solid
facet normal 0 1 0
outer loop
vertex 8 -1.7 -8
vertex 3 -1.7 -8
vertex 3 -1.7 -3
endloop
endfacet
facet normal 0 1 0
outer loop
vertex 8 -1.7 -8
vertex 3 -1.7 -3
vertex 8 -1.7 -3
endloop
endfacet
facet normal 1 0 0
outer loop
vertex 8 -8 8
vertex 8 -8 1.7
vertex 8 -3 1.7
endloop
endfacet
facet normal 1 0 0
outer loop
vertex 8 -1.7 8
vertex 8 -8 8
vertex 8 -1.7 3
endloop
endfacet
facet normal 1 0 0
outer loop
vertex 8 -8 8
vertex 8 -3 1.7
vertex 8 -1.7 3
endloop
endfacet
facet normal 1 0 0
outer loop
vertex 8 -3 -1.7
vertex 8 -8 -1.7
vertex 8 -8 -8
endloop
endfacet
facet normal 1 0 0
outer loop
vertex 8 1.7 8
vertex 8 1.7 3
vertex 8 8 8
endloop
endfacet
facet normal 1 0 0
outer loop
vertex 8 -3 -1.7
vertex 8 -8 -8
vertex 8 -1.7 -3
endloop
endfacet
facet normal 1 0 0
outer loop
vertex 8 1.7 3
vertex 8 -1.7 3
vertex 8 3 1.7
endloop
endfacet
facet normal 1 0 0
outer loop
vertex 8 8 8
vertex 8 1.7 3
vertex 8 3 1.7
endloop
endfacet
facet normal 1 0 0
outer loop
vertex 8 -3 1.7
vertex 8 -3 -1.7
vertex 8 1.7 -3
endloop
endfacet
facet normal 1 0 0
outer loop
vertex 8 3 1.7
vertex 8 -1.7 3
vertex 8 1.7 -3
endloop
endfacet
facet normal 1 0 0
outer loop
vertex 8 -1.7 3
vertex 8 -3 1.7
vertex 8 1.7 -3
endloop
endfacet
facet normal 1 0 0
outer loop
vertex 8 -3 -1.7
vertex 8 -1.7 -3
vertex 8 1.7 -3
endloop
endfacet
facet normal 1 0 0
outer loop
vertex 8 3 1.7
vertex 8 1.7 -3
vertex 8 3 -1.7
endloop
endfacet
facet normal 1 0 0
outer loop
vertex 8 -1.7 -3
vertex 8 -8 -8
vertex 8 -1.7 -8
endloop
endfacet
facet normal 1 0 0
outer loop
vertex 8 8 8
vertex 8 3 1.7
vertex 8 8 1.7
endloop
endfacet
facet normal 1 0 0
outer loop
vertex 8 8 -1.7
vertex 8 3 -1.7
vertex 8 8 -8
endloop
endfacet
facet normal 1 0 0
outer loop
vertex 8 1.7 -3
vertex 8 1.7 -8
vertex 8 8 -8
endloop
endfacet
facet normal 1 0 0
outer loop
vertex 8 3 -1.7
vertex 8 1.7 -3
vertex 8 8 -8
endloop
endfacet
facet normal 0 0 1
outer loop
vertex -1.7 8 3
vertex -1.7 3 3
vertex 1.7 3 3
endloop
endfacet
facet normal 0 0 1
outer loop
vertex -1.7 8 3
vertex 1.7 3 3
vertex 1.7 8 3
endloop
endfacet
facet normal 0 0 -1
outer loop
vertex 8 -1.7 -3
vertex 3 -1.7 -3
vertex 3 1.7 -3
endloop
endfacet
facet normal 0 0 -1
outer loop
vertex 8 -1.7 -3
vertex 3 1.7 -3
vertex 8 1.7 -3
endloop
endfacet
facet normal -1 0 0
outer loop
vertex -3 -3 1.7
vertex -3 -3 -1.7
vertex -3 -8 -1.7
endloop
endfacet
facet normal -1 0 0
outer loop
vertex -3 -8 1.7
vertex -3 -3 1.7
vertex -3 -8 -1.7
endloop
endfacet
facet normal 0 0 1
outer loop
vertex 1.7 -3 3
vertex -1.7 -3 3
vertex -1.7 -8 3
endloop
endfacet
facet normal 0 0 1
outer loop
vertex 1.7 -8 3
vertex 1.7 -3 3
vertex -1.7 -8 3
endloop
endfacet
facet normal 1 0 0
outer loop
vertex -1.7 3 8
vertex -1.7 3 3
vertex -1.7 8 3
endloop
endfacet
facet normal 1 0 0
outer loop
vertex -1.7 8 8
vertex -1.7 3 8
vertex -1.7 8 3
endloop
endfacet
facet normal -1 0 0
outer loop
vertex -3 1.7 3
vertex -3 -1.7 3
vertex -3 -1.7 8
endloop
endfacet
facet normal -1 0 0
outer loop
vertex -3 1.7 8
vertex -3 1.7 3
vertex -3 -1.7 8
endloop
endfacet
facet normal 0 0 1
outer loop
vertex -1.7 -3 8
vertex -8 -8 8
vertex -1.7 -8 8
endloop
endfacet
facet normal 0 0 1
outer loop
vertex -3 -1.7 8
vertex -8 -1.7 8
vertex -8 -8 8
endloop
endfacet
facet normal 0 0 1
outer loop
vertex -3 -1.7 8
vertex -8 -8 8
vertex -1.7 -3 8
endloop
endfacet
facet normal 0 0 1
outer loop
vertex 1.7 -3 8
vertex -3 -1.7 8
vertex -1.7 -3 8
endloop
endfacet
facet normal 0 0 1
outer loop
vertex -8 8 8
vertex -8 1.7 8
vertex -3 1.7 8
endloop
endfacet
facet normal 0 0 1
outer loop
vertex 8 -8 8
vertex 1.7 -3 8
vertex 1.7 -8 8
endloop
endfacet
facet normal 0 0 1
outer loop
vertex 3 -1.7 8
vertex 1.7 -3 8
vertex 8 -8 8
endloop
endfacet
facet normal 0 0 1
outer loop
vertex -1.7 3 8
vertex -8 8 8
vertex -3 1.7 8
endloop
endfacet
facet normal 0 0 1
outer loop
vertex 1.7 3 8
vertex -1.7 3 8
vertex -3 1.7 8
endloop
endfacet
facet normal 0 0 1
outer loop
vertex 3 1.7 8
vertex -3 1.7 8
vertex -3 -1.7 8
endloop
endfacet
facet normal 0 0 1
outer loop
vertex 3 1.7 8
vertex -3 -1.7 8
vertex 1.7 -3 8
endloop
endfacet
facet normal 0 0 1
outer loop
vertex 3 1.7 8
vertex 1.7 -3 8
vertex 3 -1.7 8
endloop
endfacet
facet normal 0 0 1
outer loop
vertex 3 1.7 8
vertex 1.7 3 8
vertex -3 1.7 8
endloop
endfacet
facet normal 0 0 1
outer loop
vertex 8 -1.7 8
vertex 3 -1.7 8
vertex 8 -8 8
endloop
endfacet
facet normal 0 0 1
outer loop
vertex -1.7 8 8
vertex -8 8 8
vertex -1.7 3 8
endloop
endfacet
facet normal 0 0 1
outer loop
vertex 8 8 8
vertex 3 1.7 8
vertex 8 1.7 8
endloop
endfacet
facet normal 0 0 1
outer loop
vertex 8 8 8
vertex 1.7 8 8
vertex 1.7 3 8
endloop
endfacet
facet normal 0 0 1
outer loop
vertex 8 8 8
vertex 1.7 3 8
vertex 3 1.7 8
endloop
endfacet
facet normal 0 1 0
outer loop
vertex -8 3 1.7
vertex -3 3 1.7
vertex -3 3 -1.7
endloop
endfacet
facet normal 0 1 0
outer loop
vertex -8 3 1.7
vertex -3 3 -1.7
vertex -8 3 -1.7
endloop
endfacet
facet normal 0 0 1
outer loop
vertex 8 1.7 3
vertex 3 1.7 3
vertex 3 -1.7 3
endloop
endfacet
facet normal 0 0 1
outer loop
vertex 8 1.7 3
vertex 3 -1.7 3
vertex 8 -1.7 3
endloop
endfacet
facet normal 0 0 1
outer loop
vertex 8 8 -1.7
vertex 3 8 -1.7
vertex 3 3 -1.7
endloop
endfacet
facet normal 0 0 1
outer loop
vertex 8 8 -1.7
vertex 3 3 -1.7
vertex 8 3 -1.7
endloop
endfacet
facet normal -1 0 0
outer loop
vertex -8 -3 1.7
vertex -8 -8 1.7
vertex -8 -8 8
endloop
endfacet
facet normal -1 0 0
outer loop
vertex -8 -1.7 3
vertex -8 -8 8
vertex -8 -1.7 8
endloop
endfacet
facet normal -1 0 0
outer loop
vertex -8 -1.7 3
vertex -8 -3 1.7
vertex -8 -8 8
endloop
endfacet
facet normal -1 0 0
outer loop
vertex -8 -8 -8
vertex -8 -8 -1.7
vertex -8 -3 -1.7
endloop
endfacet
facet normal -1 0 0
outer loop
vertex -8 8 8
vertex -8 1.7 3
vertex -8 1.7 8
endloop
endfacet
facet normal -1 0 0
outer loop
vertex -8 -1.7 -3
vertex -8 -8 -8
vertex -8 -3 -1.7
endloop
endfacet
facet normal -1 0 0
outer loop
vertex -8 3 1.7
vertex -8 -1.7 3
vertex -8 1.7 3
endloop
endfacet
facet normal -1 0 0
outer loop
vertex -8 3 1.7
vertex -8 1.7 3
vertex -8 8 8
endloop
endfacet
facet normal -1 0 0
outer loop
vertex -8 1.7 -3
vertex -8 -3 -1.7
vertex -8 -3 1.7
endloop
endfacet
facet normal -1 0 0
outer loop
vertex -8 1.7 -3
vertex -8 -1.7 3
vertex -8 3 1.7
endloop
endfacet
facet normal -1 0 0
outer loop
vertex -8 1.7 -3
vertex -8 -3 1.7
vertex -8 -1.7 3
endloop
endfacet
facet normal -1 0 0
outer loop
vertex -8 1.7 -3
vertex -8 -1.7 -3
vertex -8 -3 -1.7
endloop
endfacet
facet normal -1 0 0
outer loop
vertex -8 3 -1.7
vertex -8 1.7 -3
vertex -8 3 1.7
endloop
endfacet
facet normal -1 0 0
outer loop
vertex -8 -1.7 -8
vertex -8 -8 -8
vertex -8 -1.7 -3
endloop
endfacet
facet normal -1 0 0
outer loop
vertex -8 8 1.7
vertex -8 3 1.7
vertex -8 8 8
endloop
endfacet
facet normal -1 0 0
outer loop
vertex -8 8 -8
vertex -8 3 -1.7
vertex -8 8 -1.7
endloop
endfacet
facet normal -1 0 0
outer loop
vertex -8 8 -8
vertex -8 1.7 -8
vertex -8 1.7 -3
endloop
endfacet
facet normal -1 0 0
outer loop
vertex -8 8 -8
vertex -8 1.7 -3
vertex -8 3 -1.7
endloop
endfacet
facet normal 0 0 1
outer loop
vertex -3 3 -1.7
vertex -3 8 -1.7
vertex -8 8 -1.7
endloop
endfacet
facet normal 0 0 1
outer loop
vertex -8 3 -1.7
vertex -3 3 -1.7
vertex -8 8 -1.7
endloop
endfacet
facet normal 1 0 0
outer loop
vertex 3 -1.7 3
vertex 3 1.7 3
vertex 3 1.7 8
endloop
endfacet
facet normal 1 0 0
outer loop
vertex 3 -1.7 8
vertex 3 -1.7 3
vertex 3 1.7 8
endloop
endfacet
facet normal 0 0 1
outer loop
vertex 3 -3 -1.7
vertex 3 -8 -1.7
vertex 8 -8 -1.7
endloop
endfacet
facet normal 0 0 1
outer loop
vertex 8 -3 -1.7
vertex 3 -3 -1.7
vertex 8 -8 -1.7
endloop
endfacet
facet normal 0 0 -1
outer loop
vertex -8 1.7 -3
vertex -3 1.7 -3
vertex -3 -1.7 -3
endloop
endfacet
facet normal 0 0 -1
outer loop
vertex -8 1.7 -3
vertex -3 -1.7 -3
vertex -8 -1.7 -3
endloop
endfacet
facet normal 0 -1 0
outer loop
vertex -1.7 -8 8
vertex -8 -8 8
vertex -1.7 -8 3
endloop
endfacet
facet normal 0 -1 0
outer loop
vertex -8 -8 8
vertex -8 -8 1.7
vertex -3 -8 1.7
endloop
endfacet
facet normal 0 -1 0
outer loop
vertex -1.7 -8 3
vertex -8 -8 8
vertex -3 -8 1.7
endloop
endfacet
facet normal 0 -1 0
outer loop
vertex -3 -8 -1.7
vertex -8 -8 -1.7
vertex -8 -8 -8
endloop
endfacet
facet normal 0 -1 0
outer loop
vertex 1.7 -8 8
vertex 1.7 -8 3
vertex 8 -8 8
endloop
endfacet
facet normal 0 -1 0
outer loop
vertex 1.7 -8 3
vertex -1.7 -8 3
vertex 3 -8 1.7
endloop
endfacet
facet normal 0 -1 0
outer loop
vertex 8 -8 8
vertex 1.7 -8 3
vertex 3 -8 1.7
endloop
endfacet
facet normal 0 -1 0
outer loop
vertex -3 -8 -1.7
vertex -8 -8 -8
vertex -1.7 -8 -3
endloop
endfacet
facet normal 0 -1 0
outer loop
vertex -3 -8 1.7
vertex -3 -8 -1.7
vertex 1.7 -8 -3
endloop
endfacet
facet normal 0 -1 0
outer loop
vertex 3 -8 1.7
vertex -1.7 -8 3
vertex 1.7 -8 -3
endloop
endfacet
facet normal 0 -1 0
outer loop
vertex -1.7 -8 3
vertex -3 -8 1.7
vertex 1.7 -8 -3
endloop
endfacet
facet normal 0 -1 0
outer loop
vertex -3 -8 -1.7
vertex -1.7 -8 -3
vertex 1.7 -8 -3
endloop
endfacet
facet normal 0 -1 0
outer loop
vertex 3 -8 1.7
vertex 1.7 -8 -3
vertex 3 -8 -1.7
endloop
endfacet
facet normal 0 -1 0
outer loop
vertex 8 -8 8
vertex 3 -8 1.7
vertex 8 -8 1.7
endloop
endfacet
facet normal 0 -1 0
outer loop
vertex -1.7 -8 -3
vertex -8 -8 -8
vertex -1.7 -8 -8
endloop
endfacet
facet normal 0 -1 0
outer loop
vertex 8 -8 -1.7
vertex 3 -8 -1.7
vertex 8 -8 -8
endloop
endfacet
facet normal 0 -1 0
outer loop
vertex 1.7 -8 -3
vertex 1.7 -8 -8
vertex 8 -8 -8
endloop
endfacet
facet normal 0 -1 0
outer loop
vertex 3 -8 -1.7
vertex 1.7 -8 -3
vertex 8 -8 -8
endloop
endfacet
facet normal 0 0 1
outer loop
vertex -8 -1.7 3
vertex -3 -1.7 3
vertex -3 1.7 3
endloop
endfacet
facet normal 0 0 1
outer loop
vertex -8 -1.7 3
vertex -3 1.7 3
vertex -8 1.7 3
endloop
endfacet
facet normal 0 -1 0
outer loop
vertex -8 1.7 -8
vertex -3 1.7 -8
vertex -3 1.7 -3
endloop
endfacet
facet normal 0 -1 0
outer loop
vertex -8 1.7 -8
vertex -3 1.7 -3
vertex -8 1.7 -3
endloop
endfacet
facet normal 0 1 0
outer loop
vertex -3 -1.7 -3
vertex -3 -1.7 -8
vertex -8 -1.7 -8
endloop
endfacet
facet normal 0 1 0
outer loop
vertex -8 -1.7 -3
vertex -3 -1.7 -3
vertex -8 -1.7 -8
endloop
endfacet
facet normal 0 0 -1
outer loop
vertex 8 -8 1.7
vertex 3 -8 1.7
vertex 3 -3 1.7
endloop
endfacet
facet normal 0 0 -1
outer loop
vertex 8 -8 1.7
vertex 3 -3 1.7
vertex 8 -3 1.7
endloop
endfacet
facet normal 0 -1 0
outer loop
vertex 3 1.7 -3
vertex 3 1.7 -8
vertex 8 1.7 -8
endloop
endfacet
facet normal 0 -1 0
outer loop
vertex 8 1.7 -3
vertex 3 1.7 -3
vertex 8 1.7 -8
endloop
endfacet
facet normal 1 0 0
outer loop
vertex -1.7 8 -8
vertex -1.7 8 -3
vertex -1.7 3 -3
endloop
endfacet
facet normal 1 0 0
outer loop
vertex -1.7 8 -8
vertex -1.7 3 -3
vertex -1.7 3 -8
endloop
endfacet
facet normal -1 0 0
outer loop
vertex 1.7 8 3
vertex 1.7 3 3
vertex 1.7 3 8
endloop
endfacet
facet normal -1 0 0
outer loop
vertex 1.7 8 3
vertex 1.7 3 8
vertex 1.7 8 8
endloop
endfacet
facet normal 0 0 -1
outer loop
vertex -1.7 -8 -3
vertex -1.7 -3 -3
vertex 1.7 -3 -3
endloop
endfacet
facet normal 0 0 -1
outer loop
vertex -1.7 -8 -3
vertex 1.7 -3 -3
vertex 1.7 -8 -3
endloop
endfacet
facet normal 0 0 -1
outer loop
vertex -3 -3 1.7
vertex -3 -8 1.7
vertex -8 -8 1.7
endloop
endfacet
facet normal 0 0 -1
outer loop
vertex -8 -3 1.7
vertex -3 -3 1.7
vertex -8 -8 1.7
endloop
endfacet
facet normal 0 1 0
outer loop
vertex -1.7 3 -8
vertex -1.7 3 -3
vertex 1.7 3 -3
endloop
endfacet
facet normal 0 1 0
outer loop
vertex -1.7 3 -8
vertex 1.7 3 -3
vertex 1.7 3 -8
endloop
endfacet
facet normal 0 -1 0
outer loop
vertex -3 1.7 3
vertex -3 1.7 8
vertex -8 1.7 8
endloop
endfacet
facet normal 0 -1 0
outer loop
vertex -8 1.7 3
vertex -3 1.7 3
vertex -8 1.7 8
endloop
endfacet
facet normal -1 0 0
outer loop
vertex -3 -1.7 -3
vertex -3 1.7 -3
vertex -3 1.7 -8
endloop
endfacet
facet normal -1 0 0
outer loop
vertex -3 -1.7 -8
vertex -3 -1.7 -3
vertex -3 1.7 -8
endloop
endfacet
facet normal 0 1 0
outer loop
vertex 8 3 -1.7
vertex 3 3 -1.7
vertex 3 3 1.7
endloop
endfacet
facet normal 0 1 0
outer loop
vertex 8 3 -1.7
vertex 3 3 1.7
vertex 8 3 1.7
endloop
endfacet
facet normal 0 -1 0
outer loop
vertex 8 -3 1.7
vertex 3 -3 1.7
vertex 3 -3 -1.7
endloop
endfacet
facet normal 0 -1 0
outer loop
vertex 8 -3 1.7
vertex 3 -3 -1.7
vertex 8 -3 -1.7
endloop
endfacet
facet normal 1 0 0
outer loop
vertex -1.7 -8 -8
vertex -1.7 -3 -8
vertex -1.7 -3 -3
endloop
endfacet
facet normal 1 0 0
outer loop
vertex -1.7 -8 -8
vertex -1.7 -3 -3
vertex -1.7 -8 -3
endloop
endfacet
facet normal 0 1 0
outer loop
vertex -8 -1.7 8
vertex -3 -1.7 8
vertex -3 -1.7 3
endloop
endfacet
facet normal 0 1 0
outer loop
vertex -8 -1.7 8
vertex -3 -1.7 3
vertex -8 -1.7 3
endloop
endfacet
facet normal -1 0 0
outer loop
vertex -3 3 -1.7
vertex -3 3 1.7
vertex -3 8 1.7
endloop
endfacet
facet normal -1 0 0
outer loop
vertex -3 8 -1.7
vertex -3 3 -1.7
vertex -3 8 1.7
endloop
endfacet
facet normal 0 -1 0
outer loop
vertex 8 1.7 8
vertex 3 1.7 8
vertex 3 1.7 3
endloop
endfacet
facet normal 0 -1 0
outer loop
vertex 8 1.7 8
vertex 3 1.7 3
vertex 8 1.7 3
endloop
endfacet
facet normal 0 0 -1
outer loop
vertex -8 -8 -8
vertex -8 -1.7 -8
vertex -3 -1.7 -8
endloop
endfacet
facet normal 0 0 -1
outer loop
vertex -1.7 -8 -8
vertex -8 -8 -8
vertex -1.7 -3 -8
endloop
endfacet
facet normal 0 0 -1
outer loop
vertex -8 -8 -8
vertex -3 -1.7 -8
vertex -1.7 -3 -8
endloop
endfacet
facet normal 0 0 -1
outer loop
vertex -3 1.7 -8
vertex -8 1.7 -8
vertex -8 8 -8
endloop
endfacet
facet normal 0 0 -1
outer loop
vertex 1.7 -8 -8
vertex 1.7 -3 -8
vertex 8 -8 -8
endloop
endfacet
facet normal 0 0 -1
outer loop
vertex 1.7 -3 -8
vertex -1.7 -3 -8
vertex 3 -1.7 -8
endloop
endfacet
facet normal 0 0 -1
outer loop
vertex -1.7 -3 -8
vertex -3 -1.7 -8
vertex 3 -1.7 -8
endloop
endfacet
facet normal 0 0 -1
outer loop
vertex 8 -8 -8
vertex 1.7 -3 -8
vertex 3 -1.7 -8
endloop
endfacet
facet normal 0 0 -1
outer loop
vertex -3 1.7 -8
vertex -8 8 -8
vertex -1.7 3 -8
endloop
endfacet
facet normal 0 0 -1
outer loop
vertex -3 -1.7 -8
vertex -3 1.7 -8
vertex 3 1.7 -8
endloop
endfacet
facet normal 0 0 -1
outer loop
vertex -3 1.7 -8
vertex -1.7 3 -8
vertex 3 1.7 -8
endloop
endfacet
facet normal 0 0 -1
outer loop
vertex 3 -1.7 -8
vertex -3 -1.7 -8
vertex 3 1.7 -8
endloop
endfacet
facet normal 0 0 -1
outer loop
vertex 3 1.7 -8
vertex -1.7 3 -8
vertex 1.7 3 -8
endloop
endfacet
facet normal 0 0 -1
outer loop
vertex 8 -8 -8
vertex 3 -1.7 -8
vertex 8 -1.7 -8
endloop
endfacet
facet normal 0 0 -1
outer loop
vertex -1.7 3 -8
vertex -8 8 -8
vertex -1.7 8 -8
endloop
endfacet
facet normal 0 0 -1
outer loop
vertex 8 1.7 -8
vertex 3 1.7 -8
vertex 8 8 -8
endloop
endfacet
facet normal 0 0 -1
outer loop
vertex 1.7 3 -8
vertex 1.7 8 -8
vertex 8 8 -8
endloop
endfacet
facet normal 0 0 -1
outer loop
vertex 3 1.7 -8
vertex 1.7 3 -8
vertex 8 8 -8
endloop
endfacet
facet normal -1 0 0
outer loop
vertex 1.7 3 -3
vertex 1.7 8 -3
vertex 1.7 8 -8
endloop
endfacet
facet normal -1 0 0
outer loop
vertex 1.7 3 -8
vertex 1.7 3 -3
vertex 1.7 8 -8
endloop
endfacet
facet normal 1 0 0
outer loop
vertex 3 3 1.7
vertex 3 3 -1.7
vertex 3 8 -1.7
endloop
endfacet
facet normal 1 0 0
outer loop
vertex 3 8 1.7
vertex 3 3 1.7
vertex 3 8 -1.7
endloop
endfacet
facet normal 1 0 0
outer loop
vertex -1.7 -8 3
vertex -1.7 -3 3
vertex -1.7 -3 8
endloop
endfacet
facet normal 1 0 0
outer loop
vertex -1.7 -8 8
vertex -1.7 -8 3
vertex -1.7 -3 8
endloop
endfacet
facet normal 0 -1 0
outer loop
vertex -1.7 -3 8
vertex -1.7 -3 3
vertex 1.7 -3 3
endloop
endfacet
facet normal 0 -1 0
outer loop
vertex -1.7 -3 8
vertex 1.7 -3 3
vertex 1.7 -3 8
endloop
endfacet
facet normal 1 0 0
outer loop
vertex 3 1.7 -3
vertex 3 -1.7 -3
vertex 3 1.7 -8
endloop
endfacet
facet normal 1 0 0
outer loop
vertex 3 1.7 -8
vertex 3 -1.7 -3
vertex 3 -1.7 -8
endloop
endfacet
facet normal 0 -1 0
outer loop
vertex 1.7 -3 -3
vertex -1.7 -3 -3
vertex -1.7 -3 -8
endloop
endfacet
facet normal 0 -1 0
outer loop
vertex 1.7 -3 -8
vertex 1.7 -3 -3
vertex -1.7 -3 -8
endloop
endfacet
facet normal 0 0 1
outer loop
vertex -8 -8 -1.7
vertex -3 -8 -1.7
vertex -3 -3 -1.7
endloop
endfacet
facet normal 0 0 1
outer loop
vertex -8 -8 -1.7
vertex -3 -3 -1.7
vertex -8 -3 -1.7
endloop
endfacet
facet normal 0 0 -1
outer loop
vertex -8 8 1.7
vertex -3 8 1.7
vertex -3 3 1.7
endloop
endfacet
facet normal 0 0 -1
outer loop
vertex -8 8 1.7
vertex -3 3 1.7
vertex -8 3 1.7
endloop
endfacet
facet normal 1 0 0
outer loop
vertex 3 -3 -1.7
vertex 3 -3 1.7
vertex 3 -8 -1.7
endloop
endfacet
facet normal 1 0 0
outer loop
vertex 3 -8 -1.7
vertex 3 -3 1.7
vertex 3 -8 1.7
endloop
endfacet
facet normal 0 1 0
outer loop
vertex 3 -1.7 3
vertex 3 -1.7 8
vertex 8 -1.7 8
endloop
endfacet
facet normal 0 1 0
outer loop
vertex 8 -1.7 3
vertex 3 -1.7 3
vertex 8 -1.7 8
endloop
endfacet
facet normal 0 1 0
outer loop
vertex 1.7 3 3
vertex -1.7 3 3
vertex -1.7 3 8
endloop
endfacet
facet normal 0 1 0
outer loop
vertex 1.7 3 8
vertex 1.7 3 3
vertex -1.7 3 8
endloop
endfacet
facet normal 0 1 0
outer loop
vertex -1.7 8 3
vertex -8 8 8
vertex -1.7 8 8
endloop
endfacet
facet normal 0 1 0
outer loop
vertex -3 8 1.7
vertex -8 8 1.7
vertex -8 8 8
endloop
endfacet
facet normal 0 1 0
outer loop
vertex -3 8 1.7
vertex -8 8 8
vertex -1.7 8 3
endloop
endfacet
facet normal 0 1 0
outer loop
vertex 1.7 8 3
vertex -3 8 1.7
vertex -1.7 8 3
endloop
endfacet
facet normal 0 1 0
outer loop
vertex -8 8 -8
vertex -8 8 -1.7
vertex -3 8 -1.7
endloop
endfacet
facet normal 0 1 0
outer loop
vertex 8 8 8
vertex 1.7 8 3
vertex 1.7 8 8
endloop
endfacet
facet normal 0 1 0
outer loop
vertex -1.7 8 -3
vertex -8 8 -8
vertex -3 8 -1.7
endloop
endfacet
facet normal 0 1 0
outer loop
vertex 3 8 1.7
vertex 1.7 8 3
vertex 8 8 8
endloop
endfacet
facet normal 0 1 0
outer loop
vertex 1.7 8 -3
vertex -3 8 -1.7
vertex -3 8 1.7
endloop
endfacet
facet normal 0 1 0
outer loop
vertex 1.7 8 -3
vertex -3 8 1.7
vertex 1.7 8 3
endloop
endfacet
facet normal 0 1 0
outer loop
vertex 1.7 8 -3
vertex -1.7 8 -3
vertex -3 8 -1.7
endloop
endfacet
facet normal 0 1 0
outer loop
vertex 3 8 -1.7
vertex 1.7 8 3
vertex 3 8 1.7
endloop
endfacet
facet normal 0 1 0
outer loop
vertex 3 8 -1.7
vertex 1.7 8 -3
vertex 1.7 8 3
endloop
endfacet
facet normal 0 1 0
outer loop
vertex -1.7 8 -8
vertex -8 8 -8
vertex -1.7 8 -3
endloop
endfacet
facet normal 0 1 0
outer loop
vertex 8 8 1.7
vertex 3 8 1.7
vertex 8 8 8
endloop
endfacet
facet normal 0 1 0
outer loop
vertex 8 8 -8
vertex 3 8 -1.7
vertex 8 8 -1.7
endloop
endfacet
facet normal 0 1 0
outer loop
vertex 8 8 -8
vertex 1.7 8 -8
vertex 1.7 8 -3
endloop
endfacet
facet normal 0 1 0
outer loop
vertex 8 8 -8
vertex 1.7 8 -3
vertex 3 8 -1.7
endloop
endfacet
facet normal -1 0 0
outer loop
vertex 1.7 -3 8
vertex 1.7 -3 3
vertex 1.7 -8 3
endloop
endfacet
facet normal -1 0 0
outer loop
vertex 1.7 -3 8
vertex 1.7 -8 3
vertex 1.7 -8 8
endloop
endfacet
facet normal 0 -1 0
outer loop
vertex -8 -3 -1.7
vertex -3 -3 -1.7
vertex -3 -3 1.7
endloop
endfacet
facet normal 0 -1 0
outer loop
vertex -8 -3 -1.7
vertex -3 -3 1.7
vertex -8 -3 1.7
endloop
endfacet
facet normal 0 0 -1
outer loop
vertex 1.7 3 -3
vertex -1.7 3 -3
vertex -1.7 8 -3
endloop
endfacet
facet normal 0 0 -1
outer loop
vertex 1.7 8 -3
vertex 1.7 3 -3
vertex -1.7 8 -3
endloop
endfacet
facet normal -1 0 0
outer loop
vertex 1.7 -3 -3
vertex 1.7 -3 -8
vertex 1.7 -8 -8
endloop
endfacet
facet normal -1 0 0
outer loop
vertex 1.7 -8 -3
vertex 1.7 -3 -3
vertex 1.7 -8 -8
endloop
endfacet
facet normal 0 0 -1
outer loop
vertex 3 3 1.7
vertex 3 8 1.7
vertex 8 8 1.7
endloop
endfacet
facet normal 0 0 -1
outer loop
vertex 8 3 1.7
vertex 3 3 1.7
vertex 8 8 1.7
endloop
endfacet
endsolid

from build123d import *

# Parameters (mm, degrees)
BOX002_W       = 90
BOX002_H       = 90
BOX002_DEPTH   = 3.4
ARRAY004_COUNT = 3
ARRAY004_ANGLE = 180
ARRAY_COUNT    = 4
BOX_W          = 16
BOX_H          = 16
BOX_DEPTH      = 16


with BuildPart() as array:
    # Box002 → Box002 (new body)
    with BuildSketch(Plane(origin=(3, 3, -1.7), x_dir=(1, 0, 0), z_dir=(0, 0, 1))):
        with Locations((45, 45)):
            Rectangle(BOX002_W, BOX002_H)
    extrude(amount=BOX002_DEPTH)

    # Array004: Array ×3 about axis
    array004_axis = Axis((0, 0, 0), (0, 1, 0))


with BuildPart() as array_1:
    add(array.part)
    for i in range(1, ARRAY004_COUNT):
        add(array.part.rotate(array004_axis, i * ARRAY004_ANGLE / (ARRAY004_COUNT - 1)))

    # Array: Array ×4 about axis
    array_axis = Axis((0, 0, 0), (1, 0, 0))


with BuildPart() as array_2:
    add(array_1.part)
    for i in range(1, ARRAY_COUNT):
        add(array_1.part.rotate(array_axis, i * 360 / ARRAY_COUNT))


with BuildPart() as cut001:
    # Box → Box (new body)
    with BuildSketch(Plane(origin=(-8, -8, -8), x_dir=(1, 0, 0), z_dir=(0, 0, 1))):
        with Locations((8, 8)):
            Rectangle(BOX_W, BOX_H)
    extrude(amount=BOX_DEPTH)

    # Cut001: cut Array
    add(array_2.part, mode=Mode.SUBTRACT)


solid = cut001.part
